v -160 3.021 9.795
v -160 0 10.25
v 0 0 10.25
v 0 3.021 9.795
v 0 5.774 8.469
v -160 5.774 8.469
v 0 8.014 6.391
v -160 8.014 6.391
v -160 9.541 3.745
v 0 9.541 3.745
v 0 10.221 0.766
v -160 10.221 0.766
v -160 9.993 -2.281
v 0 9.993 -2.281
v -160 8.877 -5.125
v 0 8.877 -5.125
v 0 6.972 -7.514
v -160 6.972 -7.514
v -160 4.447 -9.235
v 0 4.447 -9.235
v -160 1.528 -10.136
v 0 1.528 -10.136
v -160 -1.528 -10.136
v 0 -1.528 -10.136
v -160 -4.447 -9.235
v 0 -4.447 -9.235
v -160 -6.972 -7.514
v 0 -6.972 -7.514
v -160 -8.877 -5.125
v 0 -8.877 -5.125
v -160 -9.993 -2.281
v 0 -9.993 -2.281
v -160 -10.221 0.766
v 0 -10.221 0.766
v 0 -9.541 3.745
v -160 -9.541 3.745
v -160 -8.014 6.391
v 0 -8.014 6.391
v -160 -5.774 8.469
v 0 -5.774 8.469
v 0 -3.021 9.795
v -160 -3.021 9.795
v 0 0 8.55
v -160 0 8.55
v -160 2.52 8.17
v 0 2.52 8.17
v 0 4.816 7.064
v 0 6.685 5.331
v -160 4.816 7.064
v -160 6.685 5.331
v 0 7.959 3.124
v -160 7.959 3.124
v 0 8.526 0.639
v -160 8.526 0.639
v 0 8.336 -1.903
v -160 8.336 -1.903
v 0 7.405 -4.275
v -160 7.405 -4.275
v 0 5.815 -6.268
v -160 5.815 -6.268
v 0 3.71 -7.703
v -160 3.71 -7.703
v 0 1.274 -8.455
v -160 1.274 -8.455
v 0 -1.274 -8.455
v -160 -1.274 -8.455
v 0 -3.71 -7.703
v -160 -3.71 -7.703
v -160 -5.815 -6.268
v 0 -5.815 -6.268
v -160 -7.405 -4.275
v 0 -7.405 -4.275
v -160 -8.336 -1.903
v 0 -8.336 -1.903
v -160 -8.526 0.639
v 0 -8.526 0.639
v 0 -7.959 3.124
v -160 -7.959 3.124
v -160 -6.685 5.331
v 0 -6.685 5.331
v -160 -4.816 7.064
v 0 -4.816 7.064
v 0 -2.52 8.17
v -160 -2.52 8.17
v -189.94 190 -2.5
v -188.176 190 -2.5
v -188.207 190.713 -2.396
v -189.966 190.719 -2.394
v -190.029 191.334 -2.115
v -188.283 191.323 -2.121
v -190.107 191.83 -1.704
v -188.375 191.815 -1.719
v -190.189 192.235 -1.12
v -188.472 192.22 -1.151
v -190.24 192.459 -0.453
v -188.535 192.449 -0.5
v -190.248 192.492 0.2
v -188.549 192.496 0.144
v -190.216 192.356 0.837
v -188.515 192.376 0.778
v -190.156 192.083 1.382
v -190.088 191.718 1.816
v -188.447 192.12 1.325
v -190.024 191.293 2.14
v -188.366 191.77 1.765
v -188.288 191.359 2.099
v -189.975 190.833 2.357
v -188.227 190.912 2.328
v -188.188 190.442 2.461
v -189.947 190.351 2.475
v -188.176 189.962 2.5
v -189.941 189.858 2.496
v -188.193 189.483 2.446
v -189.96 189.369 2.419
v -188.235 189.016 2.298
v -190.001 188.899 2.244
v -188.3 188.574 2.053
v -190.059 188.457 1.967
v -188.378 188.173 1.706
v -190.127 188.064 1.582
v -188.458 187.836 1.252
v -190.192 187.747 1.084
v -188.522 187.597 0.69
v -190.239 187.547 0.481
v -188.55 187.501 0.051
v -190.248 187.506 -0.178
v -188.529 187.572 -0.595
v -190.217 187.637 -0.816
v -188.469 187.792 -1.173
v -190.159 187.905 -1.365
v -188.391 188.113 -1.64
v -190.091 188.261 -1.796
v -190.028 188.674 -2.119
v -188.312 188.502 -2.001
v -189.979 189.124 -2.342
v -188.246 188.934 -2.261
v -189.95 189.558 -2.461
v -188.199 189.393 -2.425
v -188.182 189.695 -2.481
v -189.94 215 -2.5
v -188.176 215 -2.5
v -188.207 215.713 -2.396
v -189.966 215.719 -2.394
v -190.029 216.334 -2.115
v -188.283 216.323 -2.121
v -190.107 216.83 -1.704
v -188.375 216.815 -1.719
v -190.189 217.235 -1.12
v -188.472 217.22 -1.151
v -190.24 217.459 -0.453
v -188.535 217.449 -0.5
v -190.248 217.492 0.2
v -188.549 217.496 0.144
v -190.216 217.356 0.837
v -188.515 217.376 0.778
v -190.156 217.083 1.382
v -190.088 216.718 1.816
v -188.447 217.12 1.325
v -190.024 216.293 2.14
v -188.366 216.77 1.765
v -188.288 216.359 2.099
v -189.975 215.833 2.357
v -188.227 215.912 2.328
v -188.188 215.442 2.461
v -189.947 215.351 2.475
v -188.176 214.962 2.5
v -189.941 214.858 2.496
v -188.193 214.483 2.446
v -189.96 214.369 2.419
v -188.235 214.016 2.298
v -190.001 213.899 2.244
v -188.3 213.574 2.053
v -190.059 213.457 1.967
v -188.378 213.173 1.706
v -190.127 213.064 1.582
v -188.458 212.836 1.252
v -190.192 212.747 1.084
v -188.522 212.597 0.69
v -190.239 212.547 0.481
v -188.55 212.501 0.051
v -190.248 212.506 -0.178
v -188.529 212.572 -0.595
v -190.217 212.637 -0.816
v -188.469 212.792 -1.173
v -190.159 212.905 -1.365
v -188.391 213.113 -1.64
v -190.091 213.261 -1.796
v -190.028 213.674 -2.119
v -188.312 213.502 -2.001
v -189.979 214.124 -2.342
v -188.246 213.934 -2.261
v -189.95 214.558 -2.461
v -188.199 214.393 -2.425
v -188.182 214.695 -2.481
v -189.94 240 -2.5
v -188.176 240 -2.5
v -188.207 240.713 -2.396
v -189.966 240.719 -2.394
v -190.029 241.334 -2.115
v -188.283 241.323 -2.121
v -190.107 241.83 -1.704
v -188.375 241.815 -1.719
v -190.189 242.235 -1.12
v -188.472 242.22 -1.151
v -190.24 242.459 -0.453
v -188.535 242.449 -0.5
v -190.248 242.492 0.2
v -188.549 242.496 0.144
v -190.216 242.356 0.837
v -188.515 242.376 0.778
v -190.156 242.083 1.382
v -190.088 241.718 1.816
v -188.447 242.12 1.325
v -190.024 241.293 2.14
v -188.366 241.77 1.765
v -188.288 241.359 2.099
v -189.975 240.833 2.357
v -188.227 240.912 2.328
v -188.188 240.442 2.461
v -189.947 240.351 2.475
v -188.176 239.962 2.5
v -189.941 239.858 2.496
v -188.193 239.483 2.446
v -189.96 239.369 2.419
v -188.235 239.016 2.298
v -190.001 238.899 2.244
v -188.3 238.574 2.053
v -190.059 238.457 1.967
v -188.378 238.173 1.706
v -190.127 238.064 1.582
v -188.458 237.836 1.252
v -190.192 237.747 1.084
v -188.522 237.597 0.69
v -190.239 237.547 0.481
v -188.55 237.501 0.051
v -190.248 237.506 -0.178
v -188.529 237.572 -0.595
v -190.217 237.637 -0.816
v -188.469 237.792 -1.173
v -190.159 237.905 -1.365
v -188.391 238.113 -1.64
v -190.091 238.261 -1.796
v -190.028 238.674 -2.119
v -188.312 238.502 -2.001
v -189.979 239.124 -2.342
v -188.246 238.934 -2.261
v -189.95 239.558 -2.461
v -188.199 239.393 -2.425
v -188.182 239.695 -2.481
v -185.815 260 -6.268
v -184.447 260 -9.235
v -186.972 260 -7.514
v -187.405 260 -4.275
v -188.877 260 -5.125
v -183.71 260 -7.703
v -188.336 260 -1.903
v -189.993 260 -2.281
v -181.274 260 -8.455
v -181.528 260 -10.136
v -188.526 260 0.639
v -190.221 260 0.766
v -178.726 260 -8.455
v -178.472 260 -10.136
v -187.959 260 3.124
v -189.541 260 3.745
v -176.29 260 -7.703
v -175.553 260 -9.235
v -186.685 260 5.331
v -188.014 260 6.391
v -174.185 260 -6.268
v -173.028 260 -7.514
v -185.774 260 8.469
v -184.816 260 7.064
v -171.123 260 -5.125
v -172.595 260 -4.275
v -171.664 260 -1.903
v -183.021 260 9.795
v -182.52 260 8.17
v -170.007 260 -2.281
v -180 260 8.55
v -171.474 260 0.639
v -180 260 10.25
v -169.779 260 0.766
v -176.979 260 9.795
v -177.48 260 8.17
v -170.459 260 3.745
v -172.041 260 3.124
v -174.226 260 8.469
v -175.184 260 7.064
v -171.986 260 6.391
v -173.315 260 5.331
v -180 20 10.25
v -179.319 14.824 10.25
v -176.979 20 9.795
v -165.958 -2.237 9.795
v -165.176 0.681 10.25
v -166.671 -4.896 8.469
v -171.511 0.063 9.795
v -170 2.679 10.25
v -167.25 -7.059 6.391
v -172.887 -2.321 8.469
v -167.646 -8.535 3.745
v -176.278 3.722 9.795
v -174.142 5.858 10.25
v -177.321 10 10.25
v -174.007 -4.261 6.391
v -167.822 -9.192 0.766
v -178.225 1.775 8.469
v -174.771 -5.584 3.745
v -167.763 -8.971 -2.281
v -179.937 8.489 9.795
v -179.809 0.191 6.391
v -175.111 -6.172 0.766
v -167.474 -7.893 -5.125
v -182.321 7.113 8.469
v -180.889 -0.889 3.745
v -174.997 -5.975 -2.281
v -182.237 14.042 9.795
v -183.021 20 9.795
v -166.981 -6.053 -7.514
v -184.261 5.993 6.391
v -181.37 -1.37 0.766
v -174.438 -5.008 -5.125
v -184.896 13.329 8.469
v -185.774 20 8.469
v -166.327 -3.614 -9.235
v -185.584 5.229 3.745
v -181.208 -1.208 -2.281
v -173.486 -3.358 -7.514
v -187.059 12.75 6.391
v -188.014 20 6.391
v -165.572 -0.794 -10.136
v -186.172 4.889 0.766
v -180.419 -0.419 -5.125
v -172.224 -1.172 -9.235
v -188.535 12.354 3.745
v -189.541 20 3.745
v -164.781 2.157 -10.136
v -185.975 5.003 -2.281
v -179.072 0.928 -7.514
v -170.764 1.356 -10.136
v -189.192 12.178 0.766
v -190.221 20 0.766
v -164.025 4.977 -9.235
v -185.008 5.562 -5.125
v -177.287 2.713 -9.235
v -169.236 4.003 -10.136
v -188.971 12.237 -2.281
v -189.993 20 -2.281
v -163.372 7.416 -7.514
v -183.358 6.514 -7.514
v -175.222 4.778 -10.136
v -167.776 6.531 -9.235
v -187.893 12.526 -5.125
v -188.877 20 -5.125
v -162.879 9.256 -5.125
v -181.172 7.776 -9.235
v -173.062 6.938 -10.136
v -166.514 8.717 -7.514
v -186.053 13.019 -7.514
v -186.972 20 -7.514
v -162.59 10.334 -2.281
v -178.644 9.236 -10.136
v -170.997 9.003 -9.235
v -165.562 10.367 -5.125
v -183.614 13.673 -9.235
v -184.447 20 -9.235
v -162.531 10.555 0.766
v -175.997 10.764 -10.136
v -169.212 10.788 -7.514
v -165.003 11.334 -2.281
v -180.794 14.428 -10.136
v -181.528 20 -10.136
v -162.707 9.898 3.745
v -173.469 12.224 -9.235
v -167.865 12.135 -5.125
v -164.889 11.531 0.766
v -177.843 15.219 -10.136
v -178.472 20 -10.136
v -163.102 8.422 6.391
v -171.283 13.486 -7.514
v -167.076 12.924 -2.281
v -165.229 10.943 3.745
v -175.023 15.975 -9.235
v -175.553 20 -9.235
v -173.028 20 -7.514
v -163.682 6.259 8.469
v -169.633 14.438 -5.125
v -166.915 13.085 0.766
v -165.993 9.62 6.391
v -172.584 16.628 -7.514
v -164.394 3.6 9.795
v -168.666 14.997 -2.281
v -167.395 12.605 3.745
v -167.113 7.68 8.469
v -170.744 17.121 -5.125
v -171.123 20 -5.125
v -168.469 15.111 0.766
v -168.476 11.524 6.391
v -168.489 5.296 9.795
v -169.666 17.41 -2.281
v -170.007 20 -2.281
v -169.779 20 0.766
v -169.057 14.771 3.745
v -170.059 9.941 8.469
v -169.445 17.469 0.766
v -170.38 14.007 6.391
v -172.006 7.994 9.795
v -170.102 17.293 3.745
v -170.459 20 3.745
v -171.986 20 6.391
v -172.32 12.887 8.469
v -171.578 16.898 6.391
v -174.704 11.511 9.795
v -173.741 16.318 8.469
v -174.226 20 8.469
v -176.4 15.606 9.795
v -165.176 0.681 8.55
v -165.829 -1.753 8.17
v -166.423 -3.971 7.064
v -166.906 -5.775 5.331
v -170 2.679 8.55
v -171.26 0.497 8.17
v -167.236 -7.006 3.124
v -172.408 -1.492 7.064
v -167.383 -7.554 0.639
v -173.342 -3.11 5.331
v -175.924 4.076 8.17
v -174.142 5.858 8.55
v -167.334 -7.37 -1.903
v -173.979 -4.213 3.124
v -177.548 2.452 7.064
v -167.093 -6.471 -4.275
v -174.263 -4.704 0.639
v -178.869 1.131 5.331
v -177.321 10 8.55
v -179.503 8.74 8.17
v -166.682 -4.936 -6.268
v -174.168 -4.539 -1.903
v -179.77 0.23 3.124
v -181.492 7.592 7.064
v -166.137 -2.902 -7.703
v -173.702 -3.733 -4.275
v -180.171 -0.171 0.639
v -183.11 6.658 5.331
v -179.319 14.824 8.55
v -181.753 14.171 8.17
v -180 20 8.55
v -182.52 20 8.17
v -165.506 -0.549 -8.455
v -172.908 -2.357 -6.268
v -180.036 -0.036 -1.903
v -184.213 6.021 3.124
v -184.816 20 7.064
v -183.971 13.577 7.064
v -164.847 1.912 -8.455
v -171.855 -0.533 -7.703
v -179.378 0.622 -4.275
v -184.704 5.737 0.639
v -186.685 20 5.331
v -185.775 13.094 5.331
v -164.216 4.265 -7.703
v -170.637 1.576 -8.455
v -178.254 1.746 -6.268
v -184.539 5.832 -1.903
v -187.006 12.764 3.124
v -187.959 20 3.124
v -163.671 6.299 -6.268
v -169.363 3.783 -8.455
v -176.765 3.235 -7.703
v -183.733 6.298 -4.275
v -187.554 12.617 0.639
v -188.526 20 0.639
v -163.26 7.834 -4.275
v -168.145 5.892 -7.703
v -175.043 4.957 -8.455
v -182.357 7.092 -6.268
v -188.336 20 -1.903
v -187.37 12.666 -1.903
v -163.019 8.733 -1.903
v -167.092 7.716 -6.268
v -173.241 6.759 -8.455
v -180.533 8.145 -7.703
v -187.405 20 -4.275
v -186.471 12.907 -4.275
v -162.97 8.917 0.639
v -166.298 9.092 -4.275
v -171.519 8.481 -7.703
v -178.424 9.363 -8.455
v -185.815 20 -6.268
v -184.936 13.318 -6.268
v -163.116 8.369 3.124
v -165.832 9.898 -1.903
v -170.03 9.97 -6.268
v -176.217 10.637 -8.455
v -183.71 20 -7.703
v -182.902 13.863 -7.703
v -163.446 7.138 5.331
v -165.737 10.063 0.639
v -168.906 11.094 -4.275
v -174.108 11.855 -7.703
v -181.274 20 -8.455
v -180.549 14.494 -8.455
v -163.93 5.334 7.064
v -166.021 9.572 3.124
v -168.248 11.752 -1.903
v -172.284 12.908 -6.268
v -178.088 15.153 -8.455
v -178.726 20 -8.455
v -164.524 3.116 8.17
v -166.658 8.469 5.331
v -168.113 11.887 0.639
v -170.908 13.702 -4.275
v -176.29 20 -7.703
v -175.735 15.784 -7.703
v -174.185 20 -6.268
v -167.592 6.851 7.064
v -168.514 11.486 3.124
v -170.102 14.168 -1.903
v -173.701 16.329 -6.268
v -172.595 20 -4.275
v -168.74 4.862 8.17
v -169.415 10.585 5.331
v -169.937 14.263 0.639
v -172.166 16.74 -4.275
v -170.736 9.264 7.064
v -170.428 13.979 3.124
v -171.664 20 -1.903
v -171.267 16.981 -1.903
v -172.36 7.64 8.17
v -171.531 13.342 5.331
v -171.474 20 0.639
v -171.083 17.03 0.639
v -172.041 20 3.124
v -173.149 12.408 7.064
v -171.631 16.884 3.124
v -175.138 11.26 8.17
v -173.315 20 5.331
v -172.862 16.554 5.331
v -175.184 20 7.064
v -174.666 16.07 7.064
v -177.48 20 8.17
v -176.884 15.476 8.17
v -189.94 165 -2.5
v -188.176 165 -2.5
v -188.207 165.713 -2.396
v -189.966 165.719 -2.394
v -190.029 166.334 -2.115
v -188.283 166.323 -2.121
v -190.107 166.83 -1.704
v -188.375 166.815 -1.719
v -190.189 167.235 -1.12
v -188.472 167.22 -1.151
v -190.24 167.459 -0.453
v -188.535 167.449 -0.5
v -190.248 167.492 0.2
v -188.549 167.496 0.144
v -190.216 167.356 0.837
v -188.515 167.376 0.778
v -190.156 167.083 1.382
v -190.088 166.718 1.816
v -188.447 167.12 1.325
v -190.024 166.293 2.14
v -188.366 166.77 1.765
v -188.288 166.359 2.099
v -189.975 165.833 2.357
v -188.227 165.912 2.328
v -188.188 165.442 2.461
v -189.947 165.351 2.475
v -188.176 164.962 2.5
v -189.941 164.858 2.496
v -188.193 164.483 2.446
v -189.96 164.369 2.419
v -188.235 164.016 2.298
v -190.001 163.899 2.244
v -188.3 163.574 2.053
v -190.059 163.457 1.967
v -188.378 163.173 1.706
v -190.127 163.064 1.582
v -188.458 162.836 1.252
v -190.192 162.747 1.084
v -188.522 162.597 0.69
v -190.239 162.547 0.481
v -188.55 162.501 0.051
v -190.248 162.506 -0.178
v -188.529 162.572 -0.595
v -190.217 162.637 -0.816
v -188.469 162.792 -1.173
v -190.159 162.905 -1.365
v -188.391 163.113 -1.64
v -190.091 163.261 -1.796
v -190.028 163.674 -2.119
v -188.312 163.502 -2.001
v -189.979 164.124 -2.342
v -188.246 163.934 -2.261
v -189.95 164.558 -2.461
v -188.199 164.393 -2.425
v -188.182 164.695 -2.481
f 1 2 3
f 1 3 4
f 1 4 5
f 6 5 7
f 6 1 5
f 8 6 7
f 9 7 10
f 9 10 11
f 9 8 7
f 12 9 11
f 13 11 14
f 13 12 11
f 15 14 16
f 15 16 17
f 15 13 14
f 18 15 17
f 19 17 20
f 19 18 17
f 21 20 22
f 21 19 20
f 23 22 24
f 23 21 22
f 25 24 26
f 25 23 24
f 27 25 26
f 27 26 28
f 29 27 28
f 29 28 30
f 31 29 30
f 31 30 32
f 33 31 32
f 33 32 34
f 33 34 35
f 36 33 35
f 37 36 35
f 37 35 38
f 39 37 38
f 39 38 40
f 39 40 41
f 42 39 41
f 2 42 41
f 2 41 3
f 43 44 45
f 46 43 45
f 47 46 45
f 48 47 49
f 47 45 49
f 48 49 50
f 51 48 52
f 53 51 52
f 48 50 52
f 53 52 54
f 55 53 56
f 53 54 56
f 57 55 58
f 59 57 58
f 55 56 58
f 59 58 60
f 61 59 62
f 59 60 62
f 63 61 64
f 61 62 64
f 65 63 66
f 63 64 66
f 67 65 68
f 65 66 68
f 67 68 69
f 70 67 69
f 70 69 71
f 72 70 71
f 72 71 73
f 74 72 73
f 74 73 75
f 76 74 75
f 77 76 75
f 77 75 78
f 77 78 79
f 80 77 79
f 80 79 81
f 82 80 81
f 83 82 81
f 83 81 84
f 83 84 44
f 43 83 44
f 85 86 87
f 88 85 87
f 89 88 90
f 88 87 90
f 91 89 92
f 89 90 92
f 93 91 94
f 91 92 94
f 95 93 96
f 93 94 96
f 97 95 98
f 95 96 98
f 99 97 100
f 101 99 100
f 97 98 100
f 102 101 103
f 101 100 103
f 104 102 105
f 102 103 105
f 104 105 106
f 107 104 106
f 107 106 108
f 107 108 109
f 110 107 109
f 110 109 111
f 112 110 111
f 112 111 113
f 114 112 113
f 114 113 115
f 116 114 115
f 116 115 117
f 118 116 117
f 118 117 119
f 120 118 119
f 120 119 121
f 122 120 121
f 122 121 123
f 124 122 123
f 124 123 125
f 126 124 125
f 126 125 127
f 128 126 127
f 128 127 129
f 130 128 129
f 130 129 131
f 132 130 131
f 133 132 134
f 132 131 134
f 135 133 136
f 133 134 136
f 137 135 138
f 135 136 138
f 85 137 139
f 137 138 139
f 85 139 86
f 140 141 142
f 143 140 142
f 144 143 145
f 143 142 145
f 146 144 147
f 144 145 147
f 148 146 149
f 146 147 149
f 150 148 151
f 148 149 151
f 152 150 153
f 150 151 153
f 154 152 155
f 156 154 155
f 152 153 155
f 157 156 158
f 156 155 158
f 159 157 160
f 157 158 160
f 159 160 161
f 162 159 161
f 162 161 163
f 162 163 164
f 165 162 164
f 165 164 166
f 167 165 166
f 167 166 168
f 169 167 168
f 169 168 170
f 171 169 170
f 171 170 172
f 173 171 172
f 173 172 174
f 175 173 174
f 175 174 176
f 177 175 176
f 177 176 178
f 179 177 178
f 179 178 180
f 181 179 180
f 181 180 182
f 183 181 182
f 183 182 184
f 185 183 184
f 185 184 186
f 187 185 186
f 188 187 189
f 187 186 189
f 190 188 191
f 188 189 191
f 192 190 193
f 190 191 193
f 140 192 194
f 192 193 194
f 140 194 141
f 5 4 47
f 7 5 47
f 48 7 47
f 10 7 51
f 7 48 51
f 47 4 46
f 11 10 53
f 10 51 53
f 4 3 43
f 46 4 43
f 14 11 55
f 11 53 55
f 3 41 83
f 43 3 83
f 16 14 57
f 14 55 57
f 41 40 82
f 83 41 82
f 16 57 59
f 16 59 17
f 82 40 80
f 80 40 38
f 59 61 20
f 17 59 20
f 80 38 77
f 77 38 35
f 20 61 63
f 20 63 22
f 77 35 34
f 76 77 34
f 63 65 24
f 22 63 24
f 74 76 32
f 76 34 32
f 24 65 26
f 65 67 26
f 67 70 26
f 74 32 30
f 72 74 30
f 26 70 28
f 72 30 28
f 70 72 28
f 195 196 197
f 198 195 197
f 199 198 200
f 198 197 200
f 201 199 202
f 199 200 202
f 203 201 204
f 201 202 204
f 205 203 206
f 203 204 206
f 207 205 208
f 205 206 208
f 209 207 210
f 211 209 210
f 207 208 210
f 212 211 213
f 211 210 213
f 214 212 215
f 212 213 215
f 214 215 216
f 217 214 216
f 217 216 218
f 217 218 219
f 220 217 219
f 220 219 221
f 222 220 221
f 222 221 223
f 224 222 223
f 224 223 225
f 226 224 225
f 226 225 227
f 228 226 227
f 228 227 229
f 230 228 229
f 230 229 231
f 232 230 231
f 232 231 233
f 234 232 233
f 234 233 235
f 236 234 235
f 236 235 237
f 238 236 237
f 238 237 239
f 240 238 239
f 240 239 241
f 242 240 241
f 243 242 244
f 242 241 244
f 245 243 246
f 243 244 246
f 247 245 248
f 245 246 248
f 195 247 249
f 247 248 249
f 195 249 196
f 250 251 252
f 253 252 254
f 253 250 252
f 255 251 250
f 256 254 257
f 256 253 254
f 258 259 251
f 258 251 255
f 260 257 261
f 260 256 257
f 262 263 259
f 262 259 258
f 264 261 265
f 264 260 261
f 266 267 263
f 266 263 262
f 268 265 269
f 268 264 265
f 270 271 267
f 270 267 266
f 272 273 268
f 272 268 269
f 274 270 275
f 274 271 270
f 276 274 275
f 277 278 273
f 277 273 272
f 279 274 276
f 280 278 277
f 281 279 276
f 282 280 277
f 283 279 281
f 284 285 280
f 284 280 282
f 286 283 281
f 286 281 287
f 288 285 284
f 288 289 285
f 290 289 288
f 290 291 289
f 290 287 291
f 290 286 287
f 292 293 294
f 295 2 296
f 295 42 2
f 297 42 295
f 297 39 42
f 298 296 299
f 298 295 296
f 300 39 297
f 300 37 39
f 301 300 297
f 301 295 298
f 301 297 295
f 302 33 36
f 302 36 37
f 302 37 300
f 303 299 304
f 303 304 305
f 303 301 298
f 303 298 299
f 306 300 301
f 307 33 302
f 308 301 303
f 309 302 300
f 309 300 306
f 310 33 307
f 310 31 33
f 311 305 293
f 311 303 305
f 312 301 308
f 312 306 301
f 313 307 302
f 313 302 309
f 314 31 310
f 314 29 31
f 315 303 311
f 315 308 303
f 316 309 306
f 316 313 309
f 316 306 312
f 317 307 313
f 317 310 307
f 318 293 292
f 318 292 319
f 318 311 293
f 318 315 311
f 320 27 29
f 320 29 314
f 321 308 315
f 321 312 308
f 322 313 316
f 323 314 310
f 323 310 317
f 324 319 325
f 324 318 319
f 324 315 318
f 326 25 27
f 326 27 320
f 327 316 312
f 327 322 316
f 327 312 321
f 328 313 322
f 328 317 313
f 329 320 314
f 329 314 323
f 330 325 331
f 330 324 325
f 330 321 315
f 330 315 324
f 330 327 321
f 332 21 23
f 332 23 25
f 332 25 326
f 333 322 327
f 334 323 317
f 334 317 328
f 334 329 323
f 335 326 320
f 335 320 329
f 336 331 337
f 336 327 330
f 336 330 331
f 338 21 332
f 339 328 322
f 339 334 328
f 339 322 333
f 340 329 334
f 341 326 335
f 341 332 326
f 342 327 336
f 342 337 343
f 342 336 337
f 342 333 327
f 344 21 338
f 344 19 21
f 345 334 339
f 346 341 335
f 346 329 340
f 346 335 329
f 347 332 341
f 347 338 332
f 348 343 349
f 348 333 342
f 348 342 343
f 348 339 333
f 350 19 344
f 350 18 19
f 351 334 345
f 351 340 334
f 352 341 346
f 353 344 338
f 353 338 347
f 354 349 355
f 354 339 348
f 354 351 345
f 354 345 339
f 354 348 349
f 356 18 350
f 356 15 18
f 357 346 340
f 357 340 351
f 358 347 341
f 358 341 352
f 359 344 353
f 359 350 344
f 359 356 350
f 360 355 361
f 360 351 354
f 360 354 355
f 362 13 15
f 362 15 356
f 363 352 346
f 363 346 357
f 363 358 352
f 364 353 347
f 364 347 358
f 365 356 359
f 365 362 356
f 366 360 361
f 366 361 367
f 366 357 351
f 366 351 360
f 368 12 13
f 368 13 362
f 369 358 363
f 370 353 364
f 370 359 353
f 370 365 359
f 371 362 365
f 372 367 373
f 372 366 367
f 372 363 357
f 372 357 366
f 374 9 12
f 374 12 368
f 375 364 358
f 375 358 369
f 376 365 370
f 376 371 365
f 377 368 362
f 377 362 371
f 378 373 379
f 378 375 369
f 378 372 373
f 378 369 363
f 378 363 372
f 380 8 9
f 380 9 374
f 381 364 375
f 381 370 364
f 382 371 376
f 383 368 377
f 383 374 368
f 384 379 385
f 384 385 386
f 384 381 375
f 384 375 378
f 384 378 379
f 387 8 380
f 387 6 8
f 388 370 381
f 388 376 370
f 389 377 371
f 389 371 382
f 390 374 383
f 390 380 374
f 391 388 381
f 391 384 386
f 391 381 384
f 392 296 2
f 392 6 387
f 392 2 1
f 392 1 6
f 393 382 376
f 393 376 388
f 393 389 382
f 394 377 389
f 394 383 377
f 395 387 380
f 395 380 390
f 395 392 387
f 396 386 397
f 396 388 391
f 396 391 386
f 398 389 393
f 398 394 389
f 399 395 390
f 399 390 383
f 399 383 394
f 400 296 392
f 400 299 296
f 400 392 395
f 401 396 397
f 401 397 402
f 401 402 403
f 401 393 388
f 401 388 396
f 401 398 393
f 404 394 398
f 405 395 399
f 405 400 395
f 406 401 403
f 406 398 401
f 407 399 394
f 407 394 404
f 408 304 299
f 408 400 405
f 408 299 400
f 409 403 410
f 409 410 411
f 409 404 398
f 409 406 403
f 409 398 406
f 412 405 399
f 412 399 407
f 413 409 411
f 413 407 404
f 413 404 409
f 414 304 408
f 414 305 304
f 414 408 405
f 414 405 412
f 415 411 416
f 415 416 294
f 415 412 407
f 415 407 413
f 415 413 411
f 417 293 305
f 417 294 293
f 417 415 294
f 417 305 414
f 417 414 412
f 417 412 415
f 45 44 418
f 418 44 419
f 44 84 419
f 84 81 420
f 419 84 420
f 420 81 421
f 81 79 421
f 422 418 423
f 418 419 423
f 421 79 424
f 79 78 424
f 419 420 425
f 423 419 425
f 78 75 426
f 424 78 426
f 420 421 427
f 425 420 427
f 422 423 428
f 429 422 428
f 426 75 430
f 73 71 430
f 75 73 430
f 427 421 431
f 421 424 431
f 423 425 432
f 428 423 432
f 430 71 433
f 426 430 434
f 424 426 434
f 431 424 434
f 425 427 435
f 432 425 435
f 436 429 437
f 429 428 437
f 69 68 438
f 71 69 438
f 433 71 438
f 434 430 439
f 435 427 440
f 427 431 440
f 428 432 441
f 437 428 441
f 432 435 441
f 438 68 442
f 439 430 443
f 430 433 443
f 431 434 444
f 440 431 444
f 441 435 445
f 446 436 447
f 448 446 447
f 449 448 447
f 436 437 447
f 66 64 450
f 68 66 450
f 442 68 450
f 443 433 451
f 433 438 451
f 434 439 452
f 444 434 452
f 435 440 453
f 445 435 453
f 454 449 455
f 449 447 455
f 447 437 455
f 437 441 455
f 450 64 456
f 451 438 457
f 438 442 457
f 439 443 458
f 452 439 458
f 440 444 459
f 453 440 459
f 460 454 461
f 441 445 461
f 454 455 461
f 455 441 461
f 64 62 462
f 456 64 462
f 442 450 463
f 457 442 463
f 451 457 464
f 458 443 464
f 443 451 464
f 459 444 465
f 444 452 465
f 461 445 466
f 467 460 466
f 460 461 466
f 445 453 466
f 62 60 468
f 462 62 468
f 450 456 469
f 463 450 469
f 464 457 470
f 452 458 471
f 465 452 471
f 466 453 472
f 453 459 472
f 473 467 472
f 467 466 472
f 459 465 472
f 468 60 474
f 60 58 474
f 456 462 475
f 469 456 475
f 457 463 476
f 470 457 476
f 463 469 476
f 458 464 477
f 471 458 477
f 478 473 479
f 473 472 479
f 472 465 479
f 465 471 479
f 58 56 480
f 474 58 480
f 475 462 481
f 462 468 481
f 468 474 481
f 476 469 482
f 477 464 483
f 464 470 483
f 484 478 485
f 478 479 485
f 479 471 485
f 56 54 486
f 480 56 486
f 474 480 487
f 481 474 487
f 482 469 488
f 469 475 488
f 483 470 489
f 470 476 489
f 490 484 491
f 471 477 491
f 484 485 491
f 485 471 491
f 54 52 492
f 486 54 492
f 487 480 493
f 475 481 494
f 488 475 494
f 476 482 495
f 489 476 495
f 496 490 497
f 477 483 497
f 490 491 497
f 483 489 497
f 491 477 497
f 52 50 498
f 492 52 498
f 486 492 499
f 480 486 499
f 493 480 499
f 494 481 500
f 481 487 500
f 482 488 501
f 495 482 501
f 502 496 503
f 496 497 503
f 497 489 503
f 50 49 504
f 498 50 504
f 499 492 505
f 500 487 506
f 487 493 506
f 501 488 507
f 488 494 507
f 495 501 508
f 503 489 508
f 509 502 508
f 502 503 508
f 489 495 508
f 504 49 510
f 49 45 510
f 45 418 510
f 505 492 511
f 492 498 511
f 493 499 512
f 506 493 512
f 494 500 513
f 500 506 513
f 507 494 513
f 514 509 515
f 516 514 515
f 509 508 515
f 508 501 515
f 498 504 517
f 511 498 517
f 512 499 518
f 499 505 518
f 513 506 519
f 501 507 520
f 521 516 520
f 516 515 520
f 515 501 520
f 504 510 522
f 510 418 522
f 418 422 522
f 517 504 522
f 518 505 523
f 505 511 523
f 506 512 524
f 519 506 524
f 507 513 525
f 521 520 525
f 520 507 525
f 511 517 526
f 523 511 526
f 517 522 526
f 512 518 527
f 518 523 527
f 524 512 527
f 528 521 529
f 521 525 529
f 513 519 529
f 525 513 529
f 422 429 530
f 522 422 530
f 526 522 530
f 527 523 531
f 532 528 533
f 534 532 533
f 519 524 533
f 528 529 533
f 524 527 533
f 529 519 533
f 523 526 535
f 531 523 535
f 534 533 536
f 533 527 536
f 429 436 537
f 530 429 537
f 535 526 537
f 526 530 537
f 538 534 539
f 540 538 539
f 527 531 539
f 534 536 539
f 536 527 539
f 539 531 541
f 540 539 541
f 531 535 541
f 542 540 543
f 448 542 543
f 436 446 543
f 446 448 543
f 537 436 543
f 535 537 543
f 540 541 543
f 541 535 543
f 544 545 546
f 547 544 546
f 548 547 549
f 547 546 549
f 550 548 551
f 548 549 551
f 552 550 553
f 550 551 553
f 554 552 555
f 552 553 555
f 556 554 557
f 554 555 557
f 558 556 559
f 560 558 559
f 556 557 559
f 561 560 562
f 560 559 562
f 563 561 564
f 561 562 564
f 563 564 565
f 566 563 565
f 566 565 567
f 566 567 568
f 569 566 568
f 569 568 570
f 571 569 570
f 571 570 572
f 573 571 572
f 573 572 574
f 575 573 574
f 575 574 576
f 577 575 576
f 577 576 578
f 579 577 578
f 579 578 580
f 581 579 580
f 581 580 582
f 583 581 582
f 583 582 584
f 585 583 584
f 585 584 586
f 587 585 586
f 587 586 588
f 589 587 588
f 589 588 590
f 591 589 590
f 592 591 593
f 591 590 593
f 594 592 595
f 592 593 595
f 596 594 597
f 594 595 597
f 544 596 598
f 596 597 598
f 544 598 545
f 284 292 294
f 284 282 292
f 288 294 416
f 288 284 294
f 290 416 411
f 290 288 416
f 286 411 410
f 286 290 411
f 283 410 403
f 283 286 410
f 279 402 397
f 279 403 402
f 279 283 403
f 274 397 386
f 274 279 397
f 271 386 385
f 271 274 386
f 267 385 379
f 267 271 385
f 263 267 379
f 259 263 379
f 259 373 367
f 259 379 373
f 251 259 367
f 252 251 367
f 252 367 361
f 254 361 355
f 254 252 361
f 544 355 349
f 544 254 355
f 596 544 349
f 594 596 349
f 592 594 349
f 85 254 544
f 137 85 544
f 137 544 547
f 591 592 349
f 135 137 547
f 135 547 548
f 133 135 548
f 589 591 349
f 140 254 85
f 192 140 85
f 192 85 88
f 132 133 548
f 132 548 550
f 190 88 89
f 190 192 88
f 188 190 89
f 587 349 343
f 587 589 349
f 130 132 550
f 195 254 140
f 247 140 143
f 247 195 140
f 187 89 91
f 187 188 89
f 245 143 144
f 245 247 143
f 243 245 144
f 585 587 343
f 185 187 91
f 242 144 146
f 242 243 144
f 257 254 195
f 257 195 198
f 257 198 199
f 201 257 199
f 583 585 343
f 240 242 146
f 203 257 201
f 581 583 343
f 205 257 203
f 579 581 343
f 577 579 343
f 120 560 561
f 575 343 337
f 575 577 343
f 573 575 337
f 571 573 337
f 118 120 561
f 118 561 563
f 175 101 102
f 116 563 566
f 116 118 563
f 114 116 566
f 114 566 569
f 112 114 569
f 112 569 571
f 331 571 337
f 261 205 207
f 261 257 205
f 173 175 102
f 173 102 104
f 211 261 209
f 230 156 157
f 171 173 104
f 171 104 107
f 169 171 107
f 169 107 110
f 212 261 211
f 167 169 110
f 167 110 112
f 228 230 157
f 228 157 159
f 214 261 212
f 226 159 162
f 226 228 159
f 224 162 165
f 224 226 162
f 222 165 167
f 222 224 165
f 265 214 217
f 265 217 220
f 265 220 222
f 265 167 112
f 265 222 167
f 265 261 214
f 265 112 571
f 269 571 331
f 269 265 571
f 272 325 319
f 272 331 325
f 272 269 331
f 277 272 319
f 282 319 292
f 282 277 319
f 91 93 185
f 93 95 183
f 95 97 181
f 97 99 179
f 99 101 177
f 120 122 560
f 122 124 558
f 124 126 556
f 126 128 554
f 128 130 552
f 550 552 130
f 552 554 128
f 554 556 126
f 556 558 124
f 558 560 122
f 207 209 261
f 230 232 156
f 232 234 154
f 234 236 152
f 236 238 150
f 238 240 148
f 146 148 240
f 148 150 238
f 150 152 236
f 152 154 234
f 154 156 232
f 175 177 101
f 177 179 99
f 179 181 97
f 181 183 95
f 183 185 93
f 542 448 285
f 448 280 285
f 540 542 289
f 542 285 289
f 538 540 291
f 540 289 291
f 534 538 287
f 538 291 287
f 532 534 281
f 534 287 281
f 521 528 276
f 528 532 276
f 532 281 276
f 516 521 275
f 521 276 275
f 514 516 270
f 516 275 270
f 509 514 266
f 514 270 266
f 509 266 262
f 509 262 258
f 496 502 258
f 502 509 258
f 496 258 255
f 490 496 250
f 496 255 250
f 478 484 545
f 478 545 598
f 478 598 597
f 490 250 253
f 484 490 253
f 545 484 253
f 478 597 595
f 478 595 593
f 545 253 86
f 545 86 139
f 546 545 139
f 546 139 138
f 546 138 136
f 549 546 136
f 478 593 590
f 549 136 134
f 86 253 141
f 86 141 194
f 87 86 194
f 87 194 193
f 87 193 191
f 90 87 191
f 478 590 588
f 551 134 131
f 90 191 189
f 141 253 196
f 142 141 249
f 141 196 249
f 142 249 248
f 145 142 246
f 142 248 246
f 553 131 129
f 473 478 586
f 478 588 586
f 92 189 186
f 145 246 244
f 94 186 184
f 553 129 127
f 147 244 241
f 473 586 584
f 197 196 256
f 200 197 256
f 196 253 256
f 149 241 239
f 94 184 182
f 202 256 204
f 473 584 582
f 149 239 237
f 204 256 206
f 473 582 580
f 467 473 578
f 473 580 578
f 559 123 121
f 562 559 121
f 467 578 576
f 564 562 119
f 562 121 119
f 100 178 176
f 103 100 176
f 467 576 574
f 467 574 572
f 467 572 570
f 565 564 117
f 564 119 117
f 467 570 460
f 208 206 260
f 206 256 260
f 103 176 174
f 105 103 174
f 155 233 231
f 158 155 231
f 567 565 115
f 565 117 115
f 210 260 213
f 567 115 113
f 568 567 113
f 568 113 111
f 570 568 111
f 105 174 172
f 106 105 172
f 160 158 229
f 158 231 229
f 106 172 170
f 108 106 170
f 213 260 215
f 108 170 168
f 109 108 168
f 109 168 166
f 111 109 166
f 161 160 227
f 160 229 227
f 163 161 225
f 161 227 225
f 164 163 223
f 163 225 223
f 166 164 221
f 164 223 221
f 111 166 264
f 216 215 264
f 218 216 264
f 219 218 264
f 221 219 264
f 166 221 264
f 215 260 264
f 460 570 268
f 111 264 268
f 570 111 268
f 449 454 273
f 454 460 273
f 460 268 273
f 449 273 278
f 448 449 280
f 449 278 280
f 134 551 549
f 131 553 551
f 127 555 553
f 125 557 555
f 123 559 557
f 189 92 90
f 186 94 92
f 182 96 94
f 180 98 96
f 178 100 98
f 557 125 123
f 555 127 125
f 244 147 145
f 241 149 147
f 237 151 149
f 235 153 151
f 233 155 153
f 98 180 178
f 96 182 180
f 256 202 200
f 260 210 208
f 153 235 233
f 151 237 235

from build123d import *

# Parameters (mm, degrees)
ESBO_O6_R                 = 10.25
ESBO_O6_R_2               = 8.55
FURO_ROSCADO_DE_M61_D     = 5
FURO_ROSCADO_DE_M61_DEPTH = 15
FURO_ROSCADO_DE_M61_TIP   = 1.502151548


with BuildPart() as part:
    # Varredura1: sweep along a path in Esboço5
    with BuildLine(Plane.XY) as varredura1_path:
        Line((0, 0), (-160, 0))
        ThreePointArc((-160, 0), (-174.142135624, 5.857864376), (-180, 20))
        Line((-180, 20), (-180, 260))
    # Esboço6 → Varredura1 (sweep)
    with BuildSketch(Plane.ZY):
        Circle(ESBO_O6_R)
        Circle(ESBO_O6_R_2, mode=Mode.SUBTRACT)
    sweep(path=varredura1_path.line)

    # Furo roscado de M61
    with Locations(Plane.ZY.offset(195)):
        with Locations((0, 240), (0, 215), (0, 190), (0, 165)):
            Hole(FURO_ROSCADO_DE_M61_D / 2, depth=FURO_ROSCADO_DE_M61_DEPTH)
            with Locations((0, 0, -(FURO_ROSCADO_DE_M61_DEPTH + FURO_ROSCADO_DE_M61_TIP / 2))):  # 118° drill point
                Cone(0, FURO_ROSCADO_DE_M61_D / 2, FURO_ROSCADO_DE_M61_TIP, mode=Mode.SUBTRACT)


solid = part.part
